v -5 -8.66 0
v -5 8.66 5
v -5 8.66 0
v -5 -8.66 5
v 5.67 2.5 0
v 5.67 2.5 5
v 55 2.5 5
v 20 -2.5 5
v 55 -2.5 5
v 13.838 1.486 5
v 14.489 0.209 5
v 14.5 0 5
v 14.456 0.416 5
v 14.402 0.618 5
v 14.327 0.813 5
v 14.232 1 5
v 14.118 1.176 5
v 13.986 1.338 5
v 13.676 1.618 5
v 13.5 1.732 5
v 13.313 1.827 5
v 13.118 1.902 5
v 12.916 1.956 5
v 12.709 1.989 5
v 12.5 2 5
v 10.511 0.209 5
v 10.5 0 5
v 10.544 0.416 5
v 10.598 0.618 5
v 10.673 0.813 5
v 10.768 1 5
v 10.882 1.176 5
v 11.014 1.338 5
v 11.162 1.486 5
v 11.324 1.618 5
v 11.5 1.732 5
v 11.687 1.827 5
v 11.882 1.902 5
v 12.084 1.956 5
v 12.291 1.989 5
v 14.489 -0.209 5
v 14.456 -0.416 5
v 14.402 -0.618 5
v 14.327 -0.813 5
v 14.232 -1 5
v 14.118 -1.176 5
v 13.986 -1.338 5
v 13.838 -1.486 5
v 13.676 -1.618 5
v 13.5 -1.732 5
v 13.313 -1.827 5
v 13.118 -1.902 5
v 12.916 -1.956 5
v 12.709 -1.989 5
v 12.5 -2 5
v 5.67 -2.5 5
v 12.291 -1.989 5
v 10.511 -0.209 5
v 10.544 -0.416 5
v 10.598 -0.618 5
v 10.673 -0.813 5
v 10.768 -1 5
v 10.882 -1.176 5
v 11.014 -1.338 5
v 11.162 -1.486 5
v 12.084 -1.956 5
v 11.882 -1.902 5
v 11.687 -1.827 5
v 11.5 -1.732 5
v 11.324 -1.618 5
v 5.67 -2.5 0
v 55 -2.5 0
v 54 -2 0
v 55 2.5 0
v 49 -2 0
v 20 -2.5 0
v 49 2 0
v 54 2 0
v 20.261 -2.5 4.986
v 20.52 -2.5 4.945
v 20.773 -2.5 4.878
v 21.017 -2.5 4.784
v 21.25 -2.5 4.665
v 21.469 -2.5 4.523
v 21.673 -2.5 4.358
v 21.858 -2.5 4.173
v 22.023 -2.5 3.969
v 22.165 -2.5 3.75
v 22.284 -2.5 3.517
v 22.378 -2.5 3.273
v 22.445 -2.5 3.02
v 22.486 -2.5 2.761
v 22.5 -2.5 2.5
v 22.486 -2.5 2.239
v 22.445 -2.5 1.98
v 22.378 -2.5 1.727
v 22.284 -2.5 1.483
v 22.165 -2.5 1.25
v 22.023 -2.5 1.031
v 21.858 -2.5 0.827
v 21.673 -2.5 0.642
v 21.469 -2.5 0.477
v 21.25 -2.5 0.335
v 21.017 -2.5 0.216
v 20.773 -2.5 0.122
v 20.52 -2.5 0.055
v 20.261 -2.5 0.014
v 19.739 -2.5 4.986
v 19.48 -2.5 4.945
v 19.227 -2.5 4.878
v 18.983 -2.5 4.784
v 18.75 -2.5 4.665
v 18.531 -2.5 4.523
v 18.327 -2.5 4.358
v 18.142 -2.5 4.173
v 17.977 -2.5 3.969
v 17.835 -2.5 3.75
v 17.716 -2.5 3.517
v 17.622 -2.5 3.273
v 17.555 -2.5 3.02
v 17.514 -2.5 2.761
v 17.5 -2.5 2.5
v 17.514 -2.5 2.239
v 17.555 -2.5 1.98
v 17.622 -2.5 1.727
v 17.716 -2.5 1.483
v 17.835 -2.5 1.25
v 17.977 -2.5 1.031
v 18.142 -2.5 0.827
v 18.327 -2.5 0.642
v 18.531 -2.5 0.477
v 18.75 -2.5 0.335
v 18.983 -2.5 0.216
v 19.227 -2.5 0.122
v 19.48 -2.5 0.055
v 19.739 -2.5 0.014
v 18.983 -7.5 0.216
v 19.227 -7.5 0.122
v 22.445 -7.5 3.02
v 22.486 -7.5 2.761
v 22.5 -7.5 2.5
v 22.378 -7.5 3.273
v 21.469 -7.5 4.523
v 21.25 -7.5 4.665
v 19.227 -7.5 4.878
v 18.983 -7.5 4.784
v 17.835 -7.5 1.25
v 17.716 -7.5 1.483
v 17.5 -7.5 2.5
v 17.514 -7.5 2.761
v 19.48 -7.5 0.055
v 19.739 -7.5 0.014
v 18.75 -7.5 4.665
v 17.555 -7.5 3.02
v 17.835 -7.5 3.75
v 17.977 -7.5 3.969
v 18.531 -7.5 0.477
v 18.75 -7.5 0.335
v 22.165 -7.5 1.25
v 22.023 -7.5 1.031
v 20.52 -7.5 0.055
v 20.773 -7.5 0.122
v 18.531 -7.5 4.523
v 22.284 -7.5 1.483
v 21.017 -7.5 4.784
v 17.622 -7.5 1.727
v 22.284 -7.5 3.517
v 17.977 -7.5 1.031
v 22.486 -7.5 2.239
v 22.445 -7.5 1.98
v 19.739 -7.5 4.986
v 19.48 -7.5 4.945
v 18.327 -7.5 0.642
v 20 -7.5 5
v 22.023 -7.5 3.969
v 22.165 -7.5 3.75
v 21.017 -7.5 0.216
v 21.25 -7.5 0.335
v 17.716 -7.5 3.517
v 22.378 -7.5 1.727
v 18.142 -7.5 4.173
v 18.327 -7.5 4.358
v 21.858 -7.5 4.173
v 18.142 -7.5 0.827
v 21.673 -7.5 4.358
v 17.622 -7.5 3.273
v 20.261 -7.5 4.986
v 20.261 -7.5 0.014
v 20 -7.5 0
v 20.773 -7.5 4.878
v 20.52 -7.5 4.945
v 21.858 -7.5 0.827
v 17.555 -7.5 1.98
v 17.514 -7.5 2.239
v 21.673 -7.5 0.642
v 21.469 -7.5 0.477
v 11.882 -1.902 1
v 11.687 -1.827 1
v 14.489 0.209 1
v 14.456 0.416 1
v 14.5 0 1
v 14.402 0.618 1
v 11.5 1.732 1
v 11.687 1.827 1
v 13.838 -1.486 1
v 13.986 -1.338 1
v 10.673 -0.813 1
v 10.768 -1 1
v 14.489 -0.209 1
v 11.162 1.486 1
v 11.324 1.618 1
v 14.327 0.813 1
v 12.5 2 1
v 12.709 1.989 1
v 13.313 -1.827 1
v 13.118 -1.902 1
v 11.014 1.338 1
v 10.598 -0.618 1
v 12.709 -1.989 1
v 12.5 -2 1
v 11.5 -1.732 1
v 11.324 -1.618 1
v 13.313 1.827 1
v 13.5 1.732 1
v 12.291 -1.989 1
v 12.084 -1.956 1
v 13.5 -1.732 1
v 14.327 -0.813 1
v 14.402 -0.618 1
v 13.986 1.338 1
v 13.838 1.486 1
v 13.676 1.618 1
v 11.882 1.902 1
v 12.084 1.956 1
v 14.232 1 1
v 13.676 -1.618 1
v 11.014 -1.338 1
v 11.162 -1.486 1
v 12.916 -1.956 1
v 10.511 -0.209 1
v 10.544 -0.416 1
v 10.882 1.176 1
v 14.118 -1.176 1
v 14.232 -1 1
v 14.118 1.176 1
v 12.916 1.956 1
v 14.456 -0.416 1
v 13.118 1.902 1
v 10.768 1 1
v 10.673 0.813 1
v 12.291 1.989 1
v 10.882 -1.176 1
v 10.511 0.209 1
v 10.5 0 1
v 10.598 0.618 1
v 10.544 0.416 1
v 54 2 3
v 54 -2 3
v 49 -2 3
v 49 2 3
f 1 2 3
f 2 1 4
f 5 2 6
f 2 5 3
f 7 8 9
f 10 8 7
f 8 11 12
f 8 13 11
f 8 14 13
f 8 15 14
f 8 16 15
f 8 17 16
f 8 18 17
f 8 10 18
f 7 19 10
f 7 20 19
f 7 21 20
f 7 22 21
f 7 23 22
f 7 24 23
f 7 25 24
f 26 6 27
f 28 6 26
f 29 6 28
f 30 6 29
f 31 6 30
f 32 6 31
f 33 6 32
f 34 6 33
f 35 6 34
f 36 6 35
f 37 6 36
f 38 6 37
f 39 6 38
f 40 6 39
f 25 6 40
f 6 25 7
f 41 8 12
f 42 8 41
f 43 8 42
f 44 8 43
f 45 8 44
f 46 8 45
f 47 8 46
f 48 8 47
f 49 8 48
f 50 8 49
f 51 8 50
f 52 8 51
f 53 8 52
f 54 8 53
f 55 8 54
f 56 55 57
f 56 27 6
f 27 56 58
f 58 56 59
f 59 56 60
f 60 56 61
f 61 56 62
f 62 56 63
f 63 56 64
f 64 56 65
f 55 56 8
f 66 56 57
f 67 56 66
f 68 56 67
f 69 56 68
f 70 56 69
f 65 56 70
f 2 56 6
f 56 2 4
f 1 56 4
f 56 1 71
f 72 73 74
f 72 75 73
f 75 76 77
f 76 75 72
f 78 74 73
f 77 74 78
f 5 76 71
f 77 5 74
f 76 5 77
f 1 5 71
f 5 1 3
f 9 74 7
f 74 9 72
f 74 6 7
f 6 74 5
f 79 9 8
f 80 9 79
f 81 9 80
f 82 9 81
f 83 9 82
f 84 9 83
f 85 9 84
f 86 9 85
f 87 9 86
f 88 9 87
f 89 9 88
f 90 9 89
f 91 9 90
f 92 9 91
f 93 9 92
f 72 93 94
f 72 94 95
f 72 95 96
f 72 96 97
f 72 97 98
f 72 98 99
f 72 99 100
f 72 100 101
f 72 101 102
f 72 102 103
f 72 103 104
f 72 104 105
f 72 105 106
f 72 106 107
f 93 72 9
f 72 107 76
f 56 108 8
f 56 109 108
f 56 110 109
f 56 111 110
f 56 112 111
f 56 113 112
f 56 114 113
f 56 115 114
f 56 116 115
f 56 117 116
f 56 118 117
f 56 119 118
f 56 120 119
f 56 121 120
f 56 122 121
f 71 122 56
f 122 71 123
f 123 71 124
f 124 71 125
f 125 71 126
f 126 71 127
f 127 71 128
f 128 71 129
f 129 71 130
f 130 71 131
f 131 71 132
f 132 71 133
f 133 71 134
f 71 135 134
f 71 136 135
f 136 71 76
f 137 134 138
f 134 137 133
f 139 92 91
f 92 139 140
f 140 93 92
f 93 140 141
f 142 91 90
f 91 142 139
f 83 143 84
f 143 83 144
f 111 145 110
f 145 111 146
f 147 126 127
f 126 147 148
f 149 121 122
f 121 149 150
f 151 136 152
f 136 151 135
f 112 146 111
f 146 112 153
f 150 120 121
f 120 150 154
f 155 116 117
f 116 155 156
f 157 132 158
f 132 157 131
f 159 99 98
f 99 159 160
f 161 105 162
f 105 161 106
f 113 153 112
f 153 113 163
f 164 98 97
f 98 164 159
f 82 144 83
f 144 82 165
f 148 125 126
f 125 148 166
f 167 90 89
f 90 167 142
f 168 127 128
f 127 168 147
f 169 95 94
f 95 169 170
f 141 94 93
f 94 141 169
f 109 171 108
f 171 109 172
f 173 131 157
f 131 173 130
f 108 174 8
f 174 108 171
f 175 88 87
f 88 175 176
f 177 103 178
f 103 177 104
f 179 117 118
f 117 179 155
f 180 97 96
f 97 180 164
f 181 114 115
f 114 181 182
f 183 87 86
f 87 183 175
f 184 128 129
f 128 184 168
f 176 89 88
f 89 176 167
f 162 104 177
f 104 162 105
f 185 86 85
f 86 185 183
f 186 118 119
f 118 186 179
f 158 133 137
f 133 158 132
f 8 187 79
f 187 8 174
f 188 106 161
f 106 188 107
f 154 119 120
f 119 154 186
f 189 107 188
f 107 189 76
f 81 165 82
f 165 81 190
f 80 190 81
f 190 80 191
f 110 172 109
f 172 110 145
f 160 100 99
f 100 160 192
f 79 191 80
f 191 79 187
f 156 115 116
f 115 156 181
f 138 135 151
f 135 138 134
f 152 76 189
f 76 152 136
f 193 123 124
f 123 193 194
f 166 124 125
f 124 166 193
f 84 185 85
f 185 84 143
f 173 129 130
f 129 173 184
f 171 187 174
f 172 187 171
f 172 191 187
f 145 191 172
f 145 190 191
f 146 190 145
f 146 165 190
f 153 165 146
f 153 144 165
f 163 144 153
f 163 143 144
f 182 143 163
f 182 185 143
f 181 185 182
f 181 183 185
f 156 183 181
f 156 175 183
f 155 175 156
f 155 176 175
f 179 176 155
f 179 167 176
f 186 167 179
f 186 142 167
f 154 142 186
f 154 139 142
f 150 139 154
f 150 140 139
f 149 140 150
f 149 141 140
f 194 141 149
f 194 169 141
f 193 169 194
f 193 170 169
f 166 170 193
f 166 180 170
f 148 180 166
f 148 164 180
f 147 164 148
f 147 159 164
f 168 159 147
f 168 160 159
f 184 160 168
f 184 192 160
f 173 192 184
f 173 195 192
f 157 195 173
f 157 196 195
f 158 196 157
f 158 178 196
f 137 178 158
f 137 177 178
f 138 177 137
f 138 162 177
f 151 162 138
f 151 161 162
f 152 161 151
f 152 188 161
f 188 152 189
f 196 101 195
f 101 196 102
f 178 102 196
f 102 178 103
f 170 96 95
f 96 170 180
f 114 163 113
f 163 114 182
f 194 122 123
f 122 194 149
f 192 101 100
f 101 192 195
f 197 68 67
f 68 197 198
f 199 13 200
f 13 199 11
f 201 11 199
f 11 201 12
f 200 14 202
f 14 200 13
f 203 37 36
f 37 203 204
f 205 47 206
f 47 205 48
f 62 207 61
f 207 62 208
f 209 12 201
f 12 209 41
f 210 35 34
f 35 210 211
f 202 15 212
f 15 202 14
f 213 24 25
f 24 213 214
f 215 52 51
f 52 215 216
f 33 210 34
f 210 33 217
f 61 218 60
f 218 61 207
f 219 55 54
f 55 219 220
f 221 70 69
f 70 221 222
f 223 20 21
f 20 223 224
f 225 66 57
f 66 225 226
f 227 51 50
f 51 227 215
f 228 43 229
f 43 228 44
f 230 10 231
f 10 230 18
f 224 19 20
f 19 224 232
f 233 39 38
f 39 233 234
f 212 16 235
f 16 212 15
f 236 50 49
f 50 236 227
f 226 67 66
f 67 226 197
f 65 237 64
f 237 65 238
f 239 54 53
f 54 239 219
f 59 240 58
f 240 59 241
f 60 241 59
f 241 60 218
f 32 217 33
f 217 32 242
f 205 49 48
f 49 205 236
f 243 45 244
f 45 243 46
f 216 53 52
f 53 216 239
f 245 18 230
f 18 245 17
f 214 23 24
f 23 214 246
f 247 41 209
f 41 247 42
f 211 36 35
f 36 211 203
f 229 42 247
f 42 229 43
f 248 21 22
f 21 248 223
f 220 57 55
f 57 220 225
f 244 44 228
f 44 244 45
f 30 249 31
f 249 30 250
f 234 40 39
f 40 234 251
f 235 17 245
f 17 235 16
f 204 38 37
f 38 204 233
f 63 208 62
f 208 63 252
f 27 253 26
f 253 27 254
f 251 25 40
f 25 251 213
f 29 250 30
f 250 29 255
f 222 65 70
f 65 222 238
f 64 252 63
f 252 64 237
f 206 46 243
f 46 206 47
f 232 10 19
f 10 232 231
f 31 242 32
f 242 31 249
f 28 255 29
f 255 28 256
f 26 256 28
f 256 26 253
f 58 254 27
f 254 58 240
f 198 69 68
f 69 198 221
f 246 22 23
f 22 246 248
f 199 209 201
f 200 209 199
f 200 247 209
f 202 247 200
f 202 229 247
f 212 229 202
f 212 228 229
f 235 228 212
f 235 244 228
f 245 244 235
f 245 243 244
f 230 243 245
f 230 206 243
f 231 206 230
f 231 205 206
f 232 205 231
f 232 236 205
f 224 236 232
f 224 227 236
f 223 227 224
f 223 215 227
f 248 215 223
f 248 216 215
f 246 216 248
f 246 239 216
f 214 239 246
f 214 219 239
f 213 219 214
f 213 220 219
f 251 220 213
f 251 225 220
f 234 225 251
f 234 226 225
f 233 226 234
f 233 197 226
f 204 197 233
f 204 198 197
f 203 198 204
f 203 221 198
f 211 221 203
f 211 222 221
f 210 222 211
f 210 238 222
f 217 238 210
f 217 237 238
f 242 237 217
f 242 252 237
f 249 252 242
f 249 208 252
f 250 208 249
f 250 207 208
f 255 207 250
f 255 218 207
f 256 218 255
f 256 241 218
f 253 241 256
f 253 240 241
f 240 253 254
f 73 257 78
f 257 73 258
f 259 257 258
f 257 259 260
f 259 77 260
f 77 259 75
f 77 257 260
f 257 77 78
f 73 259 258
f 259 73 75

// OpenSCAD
cylinder_resolution = 60;
hole_padding = 1;

module lever(lever_dimensions) {
     cube(lever_dimensions);
}

module handle(lever_dimensions) {
     cylinder(
          r=lever_dimensions[1]*2,
          h=lever_dimensions[2],
          $fn=3
          );
}

module post(bearing_dimensions) {
     rotate([90, 0, 0]) {
          cylinder(
               h=bearing_dimensions[2] + hole_padding,
               d=bearing_dimensions[1],
               $fn=cylinder_resolution
               );
     }
}

module magnet_hole(magnet_dimensions) {
     cylinder(
          d=magnet_dimensions[0],
          h=magnet_dimensions[1] + hole_padding,
          $fn=cylinder_resolution
          );
}

function extend_hole(d) = [d[0], d[1], d[2]+1];

module contact_hole(contact_dimensions) {
     cube(extend_hole(contact_dimensions), center=true);
}

function post_translation_vector(ld) = [ld[0]*0.4, -((ld[1]/2)-hole_padding), ld[2]/2];
function lever_translation_vector(ld) = [ld[1], -ld[1]/2, 0];

module handle_lever_post_union(lever_dimensions, bearing_dimensions) {
     union() {
          handle(lever_dimensions);
          translate(lever_translation_vector(lever_dimensions)) lever(lever_dimensions);
          translate(post_translation_vector(lever_dimensions)) post(bearing_dimensions);
     }
}

function contact_hole_translation_vector(ld, cd) = [(ld[0]-1)+(cd[0]/2), 0, hole_padding];
function magnet_hole_translation_vector(ld) = [(ld[0]/4), 0, hole_padding];

module holes_union(lever_dimensions, magnet_dimensions, contact_dimensions) {
     union() {
          translate(magnet_hole_translation_vector(lever_dimensions)) magnet_hole(magnet_dimensions);
          translate(contact_hole_translation_vector(lever_dimensions, contact_dimensions)) contact_hole(contact_dimensions);
     }
}

// lever_dimensions = [length, width, height]
// bearing_dimensions = [outer_diameter, inner_diameter, height]
// magnet_dimensions = [diameter, height] (square magnets not yet supported)
// contact_dimensions = [l, w, h]
module paddle(
     lever_dimensions=[50, 5, 5],
     bearing_dimensions=[0, 5, 5],
     magnet_dimensions=[4, 3],
     contact_dimensions=[5, 4, 3]
     ) {
     difference() {
          handle_lever_post_union(
               lever_dimensions=lever_dimensions,
               bearing_dimensions=bearing_dimensions
               );
          holes_union(
               lever_dimensions=lever_dimensions,
               magnet_dimensions=magnet_dimensions,
               contact_dimensions=contact_dimensions
               );
     }
}

// need to see how to raise exceptions and fail when the values don't allow for all things to be placed properly

render() {  // remove me soon, just for testing
     paddle();
}
